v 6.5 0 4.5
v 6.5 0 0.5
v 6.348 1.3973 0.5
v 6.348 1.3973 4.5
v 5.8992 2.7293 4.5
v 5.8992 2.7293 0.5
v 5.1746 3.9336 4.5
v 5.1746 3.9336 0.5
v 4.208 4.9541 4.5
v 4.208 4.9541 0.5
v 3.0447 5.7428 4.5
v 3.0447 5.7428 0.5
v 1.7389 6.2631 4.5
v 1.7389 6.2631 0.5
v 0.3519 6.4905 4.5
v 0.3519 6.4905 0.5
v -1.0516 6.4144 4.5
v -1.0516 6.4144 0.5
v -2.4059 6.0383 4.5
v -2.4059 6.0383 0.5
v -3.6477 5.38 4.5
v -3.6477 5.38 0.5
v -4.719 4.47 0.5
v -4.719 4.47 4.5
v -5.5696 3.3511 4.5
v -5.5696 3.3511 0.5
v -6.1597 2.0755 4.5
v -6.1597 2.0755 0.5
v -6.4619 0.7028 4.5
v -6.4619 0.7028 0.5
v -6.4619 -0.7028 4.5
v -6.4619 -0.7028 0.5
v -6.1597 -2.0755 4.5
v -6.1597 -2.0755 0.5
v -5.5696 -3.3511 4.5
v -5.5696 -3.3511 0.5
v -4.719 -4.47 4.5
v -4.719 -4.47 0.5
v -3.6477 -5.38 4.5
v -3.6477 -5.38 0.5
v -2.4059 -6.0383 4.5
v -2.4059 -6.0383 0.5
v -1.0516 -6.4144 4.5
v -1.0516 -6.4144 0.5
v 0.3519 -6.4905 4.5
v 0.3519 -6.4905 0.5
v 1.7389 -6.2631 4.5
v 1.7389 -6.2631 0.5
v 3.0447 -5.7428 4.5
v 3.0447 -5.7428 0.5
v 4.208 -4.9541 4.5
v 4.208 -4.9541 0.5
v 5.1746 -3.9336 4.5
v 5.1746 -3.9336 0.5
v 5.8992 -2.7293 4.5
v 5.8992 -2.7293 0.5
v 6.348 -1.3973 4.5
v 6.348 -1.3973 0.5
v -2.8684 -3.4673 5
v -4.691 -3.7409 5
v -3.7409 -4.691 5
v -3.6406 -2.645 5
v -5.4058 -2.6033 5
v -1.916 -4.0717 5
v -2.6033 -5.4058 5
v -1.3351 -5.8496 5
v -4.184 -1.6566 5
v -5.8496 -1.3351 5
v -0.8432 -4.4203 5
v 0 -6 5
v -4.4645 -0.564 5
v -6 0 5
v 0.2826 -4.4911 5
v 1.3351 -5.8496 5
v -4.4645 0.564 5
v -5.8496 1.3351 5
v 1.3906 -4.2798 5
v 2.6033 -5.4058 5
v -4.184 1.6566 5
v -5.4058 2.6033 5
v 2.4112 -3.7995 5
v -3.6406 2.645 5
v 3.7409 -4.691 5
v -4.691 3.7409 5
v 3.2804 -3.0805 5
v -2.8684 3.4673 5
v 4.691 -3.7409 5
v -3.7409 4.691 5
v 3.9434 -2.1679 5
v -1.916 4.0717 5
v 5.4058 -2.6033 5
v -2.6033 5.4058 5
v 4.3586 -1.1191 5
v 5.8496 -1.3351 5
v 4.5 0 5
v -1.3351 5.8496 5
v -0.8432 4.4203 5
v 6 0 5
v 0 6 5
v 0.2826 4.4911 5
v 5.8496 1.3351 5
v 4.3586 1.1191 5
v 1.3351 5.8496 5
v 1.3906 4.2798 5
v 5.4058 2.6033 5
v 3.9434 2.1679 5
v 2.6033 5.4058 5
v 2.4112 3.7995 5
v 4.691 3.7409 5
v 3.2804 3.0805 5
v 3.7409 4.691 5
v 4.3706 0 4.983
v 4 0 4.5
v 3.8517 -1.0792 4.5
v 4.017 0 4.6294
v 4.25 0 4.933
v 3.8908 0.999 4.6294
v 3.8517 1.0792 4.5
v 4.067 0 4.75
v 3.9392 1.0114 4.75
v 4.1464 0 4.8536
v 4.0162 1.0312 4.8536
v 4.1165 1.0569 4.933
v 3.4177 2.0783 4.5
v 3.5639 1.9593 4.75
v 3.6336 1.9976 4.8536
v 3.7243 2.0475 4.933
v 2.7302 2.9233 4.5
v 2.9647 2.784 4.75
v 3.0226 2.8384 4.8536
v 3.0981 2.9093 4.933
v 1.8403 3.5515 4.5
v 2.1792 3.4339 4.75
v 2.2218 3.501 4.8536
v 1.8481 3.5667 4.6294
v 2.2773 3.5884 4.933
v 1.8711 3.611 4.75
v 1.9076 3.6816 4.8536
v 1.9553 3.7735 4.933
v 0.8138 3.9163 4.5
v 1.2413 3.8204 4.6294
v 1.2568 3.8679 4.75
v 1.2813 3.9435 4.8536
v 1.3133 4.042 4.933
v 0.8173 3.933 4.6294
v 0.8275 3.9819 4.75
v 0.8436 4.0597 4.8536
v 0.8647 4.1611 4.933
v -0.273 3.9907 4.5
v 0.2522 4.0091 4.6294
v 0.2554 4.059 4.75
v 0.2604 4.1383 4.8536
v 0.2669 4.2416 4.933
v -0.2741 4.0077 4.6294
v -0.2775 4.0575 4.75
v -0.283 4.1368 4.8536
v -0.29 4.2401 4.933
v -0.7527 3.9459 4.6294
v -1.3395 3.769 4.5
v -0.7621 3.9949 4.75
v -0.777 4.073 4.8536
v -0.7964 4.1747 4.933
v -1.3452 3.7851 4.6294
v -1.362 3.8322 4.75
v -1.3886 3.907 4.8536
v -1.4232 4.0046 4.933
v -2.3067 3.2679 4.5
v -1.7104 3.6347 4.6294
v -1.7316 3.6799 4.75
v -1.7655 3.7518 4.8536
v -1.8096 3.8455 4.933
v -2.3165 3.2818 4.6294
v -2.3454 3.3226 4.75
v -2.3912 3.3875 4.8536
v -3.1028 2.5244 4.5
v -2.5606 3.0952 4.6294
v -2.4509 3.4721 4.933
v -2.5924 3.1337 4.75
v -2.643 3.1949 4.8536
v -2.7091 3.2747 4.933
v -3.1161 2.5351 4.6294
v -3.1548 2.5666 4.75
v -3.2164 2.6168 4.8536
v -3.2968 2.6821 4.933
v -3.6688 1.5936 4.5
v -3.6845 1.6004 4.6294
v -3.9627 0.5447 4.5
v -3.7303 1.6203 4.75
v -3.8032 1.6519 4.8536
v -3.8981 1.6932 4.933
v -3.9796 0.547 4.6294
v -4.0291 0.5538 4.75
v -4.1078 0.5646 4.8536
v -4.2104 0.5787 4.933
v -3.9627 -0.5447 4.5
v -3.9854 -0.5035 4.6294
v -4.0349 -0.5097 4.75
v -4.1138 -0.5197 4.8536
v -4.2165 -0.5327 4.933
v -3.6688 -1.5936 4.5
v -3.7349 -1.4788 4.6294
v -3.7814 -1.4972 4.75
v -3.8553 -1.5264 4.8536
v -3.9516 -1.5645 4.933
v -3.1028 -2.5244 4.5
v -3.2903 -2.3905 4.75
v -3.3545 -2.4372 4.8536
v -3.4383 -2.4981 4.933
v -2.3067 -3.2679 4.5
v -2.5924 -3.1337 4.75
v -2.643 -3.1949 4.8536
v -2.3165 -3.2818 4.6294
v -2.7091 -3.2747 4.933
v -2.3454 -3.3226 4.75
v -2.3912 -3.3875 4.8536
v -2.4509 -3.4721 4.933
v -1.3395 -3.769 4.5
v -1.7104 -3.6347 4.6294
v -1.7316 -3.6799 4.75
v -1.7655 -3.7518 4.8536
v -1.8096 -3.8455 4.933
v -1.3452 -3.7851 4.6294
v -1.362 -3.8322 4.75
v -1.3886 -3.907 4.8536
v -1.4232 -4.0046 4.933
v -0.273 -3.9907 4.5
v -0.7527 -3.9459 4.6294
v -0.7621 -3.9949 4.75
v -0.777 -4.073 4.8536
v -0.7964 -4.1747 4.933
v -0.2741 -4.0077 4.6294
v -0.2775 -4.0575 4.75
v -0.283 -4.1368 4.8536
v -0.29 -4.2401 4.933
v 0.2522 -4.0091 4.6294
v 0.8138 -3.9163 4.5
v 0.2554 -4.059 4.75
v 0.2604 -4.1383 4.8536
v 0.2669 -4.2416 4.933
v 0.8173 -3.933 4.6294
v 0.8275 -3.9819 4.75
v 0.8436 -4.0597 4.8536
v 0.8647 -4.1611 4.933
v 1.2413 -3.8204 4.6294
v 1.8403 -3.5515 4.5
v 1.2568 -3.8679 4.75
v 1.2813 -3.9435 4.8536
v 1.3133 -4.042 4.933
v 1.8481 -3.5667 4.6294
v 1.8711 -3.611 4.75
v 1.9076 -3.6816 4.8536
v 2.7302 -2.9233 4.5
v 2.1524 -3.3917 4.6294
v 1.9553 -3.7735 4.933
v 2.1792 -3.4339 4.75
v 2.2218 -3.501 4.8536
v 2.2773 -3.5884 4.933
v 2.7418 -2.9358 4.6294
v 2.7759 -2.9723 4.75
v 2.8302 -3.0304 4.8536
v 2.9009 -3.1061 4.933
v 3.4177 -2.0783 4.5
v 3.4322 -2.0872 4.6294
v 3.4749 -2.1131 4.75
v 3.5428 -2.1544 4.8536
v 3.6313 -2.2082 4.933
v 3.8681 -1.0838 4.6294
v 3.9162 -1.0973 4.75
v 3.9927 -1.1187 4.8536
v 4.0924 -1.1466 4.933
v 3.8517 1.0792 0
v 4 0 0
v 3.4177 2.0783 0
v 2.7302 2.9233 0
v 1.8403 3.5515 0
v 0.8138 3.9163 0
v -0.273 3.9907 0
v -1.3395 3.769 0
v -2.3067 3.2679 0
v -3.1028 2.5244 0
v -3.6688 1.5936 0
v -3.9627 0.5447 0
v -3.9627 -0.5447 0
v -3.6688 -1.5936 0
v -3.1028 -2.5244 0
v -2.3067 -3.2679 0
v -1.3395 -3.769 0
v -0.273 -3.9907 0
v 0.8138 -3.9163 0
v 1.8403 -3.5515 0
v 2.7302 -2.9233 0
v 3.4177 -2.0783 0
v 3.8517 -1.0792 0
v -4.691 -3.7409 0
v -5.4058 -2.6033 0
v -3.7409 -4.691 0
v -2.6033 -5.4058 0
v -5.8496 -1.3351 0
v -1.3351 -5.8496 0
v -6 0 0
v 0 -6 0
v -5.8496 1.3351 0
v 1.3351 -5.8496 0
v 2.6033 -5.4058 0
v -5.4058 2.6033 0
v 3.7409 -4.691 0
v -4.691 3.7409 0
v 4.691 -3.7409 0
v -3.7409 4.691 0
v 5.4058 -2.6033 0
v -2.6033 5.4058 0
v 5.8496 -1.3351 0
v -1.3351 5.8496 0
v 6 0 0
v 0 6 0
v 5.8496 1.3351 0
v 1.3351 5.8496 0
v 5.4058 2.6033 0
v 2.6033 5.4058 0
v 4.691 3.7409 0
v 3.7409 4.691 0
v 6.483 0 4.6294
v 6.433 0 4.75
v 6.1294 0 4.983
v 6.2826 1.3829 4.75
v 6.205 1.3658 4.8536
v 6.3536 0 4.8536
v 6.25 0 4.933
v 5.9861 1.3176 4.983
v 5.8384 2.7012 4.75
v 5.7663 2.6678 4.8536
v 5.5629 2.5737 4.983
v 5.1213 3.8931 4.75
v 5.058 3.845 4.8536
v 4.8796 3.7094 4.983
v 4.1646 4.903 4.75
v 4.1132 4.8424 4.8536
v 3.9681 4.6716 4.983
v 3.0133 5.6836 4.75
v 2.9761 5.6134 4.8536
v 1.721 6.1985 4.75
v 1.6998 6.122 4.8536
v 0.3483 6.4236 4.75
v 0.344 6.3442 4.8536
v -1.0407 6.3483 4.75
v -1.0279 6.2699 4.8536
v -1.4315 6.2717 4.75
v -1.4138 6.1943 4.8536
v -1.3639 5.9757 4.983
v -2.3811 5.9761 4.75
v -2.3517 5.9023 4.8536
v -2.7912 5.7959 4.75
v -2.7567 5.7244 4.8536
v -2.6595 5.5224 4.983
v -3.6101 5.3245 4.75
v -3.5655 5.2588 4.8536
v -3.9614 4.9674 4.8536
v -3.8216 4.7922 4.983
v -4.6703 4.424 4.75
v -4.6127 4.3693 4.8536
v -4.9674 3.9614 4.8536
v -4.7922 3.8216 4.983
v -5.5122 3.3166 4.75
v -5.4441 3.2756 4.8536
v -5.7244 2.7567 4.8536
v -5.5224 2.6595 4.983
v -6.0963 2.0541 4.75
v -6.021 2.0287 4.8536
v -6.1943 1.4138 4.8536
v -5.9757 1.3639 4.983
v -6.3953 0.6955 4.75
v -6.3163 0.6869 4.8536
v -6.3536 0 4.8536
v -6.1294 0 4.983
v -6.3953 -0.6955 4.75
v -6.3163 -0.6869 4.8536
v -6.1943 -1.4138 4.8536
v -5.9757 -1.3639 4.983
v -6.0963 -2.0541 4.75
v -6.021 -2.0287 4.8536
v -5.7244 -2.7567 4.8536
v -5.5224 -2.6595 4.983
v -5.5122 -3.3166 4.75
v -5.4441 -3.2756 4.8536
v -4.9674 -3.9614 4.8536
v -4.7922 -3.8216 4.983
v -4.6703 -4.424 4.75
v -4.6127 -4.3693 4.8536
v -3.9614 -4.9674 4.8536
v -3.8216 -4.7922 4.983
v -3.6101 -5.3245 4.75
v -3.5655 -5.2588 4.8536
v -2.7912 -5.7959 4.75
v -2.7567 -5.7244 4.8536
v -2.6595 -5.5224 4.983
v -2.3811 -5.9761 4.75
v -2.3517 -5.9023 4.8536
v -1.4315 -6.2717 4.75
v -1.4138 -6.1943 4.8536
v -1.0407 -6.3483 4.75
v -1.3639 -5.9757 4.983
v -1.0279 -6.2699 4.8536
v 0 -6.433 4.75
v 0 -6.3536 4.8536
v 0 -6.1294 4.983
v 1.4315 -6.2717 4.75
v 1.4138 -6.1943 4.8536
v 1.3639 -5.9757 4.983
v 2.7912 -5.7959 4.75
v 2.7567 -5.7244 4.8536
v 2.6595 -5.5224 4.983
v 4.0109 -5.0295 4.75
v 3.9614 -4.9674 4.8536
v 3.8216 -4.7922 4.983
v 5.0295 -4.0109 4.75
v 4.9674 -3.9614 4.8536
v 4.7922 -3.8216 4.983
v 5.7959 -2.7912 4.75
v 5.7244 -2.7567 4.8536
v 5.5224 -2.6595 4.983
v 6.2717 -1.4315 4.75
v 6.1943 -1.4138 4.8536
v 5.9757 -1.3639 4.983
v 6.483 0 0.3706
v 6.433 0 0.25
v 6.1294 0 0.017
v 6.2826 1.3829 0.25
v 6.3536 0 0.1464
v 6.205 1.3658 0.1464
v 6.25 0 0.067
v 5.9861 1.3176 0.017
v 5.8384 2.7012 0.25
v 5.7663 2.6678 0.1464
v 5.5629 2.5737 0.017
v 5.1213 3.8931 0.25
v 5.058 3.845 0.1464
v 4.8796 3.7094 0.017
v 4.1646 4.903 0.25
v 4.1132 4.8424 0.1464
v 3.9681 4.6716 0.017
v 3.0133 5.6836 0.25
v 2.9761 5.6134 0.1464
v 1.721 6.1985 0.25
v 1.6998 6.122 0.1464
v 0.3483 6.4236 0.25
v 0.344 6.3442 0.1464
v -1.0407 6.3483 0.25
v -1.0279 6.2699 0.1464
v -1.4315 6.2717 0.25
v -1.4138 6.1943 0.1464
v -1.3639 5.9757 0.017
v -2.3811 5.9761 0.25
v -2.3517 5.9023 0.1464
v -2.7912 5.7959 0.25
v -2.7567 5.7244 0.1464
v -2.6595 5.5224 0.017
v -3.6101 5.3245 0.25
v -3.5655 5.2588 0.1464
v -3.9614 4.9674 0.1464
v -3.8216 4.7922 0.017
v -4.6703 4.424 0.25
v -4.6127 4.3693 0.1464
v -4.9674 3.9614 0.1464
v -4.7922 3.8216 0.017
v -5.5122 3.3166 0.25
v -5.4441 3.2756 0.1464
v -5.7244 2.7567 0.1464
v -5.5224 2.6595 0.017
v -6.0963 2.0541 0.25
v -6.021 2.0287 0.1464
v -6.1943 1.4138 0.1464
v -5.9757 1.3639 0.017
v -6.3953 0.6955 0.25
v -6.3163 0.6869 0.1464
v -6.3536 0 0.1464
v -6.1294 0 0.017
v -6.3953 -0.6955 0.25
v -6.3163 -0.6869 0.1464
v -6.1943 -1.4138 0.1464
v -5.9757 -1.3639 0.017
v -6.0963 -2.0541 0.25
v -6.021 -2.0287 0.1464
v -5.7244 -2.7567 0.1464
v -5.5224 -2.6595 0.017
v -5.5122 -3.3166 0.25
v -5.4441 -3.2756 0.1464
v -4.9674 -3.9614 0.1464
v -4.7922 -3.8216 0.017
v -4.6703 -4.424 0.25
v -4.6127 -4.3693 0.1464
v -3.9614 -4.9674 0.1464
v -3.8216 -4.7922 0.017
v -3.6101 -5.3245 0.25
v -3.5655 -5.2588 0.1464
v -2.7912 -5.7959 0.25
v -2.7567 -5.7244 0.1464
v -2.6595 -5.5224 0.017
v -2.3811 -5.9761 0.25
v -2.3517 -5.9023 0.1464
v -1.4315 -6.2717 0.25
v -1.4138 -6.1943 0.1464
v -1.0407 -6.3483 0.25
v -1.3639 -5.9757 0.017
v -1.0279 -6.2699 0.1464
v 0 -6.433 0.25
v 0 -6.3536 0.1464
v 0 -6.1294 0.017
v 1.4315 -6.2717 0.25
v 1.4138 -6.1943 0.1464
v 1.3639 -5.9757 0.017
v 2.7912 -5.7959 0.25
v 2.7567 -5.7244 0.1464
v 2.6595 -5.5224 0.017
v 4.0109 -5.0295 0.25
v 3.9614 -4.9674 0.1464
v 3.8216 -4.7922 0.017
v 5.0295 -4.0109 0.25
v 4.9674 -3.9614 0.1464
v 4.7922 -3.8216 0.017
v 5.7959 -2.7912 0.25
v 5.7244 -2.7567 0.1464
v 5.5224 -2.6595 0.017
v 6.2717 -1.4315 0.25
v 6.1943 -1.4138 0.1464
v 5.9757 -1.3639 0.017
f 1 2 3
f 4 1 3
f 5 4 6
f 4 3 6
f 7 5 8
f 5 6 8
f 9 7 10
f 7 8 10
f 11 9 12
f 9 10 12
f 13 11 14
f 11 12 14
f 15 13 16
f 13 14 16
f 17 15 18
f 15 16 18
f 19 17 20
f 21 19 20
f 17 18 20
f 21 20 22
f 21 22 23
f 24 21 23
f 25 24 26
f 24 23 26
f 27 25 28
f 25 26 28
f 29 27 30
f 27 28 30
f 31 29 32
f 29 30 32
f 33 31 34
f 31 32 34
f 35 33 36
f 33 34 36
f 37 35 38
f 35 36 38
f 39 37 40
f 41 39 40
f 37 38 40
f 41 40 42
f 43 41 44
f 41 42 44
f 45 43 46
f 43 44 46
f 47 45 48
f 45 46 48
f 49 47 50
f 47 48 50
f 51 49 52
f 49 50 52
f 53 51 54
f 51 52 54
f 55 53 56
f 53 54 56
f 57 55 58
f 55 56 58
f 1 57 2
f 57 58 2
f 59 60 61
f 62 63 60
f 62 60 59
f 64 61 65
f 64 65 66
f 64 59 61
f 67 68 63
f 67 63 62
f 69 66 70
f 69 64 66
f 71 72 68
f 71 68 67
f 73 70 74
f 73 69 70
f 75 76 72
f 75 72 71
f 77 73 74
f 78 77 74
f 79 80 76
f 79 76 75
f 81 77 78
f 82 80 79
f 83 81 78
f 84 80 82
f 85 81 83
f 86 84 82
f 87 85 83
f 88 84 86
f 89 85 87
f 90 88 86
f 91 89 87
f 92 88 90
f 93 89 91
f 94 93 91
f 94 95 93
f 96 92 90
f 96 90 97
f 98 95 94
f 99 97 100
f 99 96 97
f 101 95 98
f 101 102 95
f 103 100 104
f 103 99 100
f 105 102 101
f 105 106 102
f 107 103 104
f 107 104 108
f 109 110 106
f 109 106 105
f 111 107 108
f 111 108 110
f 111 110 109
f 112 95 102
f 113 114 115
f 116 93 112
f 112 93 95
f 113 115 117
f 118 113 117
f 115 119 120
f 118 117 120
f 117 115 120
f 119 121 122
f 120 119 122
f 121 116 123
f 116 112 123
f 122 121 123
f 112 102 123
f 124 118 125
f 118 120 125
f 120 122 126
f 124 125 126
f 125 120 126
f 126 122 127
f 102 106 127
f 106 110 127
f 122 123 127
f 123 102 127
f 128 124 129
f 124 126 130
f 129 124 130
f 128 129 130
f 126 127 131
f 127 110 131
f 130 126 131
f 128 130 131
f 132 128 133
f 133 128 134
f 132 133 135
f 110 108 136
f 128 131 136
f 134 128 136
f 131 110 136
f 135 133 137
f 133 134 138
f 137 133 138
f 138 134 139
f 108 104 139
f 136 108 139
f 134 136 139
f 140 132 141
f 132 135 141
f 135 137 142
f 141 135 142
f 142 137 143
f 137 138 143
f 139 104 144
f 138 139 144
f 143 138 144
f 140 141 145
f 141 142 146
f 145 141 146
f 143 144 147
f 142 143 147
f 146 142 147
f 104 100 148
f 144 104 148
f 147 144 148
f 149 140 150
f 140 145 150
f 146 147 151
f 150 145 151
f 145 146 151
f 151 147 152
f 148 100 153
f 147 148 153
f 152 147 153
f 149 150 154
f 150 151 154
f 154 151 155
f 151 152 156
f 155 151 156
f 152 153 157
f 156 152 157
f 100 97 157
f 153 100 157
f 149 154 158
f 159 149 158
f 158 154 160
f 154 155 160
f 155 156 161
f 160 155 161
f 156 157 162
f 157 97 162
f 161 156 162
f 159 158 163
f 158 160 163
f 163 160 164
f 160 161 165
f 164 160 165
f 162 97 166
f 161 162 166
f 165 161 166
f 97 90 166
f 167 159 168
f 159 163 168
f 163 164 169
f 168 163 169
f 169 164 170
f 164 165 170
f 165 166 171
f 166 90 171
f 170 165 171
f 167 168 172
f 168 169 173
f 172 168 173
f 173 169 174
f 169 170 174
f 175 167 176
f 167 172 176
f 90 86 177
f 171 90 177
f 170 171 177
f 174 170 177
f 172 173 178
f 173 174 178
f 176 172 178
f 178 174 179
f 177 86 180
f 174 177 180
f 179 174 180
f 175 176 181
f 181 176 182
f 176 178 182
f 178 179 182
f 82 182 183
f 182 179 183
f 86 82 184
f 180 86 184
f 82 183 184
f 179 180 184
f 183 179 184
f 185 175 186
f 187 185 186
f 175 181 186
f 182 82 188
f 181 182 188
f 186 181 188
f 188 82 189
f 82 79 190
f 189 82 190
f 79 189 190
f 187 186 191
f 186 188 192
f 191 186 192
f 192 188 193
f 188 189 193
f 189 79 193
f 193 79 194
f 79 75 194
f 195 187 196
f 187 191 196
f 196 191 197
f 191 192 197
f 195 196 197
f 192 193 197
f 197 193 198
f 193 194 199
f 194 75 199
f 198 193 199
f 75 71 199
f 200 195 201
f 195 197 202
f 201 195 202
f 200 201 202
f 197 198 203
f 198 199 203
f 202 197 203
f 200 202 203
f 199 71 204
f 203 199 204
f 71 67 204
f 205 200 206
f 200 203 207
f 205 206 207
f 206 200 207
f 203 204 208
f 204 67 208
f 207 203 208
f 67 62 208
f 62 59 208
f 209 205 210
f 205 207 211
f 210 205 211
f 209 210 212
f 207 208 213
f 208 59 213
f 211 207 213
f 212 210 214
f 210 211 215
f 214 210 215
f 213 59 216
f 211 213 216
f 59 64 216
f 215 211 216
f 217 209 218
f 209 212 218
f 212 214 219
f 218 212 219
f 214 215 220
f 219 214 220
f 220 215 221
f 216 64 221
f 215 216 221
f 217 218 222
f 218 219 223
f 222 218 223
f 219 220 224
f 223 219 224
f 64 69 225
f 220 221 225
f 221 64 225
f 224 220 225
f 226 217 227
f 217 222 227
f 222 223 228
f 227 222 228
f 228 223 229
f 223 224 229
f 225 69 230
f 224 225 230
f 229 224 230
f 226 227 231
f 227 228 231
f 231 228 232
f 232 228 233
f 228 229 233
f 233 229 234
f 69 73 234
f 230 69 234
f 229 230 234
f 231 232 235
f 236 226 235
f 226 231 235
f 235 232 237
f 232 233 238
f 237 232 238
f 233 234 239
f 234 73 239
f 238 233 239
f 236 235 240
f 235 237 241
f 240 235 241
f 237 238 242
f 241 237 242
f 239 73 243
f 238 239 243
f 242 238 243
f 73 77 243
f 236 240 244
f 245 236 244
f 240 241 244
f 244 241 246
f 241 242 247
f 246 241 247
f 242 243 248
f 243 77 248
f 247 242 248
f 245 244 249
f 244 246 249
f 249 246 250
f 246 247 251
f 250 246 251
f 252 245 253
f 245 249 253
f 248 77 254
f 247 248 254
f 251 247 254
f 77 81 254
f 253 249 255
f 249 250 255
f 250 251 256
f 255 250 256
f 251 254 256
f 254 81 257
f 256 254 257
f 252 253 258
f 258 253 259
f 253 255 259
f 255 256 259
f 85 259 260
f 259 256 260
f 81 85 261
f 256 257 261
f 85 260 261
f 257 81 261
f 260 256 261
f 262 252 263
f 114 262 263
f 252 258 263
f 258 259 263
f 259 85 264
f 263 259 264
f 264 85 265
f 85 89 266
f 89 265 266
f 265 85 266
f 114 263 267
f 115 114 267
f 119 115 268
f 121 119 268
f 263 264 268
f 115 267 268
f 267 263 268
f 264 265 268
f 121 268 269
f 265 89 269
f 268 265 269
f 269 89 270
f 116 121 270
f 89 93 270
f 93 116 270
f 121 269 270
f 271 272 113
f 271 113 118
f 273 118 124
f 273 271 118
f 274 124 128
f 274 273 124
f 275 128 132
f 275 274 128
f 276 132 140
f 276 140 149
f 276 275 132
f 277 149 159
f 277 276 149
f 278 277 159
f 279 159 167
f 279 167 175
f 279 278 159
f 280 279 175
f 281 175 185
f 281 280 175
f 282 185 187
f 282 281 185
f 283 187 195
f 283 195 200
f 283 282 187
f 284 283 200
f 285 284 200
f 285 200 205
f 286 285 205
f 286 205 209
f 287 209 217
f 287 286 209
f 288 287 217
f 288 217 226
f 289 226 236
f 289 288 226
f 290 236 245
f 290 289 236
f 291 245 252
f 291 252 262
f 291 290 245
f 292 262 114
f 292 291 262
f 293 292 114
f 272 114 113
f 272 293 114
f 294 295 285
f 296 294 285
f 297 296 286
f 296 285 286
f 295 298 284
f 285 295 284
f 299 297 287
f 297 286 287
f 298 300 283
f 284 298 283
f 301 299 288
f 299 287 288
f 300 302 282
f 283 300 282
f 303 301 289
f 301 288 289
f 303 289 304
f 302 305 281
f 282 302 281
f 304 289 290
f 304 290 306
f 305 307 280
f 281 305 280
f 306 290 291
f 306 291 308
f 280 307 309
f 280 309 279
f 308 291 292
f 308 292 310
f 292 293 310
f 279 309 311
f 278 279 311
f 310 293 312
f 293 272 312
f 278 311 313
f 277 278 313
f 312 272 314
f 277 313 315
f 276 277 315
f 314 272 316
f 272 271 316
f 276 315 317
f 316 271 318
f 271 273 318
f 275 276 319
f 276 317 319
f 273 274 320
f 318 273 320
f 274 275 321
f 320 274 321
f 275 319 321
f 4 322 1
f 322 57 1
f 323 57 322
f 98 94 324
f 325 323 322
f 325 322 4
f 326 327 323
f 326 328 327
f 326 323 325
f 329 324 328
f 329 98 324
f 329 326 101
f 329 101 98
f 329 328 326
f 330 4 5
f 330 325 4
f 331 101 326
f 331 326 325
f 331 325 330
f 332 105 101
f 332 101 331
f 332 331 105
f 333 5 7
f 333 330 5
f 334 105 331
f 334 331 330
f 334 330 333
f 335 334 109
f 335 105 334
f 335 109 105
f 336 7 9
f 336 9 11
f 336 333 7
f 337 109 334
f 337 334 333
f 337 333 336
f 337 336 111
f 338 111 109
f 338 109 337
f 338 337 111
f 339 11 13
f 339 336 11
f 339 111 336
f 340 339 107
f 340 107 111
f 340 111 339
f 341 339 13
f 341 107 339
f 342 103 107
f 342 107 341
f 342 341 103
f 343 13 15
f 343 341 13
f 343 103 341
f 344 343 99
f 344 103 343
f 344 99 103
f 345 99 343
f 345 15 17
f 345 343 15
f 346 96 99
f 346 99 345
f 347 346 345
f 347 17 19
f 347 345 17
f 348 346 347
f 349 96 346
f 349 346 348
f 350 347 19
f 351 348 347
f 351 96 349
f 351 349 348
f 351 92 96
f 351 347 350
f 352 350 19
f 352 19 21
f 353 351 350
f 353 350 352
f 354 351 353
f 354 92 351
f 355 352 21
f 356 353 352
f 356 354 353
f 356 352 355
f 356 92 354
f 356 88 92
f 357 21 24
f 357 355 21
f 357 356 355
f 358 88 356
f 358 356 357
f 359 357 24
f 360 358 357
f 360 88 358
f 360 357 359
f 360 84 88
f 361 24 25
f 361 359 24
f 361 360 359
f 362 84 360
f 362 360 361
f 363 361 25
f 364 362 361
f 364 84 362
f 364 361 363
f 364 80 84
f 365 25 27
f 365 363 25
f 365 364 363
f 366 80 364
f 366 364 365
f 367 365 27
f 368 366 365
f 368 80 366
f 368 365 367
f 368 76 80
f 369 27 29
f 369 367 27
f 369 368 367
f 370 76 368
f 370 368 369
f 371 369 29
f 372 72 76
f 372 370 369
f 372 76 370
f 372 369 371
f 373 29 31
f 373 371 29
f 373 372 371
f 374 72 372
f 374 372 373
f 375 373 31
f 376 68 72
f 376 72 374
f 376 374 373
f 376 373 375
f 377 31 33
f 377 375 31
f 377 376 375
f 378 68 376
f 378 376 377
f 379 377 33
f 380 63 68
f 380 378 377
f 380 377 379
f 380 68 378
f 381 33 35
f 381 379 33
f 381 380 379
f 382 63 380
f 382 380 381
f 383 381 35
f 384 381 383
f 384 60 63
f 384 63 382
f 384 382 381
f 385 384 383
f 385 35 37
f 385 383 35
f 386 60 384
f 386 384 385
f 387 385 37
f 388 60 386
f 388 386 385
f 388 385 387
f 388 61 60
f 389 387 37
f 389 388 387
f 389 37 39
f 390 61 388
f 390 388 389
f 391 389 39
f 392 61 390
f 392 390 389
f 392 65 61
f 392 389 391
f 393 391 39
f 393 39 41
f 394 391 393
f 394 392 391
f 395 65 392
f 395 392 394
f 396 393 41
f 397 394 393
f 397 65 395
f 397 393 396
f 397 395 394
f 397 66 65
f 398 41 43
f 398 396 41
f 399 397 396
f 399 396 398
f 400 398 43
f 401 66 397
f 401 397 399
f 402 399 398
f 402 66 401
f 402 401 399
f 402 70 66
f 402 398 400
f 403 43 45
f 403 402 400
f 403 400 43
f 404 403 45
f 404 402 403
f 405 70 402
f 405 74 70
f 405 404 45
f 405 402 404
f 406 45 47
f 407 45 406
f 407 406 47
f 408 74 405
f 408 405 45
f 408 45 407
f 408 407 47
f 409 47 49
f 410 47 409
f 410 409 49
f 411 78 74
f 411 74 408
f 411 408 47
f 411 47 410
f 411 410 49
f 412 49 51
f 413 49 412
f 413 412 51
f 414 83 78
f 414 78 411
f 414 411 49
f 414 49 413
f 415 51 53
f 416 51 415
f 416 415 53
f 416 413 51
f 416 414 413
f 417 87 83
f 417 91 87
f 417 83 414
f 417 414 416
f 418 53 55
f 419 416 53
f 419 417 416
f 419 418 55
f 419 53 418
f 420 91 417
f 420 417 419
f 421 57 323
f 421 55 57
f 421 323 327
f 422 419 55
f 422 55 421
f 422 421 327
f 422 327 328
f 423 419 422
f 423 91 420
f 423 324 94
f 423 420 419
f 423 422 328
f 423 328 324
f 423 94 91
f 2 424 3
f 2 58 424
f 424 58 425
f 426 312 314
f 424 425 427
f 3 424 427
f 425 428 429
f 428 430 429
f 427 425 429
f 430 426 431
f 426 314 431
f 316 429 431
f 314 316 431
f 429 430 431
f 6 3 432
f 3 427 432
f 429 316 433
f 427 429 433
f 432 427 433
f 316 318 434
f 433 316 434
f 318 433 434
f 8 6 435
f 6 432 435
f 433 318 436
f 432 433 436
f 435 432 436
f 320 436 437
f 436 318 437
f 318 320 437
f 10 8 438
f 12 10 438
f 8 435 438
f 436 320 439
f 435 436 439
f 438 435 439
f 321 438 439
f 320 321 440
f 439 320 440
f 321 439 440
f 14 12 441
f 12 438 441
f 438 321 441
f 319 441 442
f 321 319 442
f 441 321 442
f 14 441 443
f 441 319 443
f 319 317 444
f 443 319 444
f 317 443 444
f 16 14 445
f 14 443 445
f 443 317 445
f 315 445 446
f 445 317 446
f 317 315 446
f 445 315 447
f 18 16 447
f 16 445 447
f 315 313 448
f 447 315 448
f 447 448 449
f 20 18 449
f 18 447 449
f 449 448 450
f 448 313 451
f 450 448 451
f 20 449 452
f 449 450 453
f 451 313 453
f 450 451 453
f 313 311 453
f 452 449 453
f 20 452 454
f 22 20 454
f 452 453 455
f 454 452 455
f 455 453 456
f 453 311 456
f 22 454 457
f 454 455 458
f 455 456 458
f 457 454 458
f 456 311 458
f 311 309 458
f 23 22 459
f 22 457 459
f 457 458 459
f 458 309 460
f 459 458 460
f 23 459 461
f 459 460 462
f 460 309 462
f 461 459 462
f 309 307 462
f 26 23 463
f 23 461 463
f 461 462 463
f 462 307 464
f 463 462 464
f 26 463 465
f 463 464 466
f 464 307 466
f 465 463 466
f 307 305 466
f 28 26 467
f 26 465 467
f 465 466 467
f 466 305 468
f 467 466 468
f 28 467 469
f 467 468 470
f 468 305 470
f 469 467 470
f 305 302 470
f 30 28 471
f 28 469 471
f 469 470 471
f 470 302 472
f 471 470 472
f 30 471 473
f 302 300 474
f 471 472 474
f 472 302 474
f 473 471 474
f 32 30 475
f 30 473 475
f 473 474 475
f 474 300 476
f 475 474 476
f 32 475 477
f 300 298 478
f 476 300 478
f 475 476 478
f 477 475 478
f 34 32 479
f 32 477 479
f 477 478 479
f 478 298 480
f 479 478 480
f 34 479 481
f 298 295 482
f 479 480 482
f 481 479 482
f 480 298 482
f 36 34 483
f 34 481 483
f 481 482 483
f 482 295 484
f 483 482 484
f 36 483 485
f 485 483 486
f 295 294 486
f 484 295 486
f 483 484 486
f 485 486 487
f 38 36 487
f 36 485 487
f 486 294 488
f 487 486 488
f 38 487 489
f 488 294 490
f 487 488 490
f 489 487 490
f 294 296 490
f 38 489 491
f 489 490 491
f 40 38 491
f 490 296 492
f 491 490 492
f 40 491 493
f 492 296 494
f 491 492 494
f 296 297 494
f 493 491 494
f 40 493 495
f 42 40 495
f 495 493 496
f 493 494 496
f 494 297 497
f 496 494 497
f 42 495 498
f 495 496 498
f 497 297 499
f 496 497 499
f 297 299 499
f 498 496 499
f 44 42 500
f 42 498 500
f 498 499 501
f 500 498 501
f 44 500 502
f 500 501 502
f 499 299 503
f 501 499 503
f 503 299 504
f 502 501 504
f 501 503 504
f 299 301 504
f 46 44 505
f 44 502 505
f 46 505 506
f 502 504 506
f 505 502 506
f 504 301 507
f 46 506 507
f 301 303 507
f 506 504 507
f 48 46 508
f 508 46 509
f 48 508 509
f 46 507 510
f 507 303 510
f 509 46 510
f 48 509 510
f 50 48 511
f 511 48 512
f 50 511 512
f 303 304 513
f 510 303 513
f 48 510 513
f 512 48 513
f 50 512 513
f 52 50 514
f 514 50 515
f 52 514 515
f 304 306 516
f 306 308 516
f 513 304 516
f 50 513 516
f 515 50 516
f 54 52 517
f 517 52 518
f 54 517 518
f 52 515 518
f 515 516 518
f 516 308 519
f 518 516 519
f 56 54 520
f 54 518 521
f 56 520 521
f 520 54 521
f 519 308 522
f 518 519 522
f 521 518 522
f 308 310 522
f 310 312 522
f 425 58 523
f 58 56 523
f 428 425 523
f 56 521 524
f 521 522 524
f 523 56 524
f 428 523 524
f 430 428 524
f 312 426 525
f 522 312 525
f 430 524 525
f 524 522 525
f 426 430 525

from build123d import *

# Parameters (mm, degrees)
SKETCH_1_R      = 6.5
SKETCH_1_R_2    = 4
EXTRUDE_1_DEPTH = 5
FILLET_1_R      = 0.5


with BuildPart() as part:
    # 草图1 → 凸台-拉伸1 (new body)
    with BuildSketch(Plane.XY):
        Circle(SKETCH_1_R)
        Circle(SKETCH_1_R_2, mode=Mode.SUBTRACT)
    extrude(amount=EXTRUDE_1_DEPTH)

    # 圆角1
    fillet_1_edges = [part.edges().sort_by_distance(p)[0] for p in [
        (-6.5, 0, 0),
        (-6.5, 0, 5),
        (-4, 0, 5),
    ]]
    fillet(fillet_1_edges, radius=FILLET_1_R)


solid = part.part
